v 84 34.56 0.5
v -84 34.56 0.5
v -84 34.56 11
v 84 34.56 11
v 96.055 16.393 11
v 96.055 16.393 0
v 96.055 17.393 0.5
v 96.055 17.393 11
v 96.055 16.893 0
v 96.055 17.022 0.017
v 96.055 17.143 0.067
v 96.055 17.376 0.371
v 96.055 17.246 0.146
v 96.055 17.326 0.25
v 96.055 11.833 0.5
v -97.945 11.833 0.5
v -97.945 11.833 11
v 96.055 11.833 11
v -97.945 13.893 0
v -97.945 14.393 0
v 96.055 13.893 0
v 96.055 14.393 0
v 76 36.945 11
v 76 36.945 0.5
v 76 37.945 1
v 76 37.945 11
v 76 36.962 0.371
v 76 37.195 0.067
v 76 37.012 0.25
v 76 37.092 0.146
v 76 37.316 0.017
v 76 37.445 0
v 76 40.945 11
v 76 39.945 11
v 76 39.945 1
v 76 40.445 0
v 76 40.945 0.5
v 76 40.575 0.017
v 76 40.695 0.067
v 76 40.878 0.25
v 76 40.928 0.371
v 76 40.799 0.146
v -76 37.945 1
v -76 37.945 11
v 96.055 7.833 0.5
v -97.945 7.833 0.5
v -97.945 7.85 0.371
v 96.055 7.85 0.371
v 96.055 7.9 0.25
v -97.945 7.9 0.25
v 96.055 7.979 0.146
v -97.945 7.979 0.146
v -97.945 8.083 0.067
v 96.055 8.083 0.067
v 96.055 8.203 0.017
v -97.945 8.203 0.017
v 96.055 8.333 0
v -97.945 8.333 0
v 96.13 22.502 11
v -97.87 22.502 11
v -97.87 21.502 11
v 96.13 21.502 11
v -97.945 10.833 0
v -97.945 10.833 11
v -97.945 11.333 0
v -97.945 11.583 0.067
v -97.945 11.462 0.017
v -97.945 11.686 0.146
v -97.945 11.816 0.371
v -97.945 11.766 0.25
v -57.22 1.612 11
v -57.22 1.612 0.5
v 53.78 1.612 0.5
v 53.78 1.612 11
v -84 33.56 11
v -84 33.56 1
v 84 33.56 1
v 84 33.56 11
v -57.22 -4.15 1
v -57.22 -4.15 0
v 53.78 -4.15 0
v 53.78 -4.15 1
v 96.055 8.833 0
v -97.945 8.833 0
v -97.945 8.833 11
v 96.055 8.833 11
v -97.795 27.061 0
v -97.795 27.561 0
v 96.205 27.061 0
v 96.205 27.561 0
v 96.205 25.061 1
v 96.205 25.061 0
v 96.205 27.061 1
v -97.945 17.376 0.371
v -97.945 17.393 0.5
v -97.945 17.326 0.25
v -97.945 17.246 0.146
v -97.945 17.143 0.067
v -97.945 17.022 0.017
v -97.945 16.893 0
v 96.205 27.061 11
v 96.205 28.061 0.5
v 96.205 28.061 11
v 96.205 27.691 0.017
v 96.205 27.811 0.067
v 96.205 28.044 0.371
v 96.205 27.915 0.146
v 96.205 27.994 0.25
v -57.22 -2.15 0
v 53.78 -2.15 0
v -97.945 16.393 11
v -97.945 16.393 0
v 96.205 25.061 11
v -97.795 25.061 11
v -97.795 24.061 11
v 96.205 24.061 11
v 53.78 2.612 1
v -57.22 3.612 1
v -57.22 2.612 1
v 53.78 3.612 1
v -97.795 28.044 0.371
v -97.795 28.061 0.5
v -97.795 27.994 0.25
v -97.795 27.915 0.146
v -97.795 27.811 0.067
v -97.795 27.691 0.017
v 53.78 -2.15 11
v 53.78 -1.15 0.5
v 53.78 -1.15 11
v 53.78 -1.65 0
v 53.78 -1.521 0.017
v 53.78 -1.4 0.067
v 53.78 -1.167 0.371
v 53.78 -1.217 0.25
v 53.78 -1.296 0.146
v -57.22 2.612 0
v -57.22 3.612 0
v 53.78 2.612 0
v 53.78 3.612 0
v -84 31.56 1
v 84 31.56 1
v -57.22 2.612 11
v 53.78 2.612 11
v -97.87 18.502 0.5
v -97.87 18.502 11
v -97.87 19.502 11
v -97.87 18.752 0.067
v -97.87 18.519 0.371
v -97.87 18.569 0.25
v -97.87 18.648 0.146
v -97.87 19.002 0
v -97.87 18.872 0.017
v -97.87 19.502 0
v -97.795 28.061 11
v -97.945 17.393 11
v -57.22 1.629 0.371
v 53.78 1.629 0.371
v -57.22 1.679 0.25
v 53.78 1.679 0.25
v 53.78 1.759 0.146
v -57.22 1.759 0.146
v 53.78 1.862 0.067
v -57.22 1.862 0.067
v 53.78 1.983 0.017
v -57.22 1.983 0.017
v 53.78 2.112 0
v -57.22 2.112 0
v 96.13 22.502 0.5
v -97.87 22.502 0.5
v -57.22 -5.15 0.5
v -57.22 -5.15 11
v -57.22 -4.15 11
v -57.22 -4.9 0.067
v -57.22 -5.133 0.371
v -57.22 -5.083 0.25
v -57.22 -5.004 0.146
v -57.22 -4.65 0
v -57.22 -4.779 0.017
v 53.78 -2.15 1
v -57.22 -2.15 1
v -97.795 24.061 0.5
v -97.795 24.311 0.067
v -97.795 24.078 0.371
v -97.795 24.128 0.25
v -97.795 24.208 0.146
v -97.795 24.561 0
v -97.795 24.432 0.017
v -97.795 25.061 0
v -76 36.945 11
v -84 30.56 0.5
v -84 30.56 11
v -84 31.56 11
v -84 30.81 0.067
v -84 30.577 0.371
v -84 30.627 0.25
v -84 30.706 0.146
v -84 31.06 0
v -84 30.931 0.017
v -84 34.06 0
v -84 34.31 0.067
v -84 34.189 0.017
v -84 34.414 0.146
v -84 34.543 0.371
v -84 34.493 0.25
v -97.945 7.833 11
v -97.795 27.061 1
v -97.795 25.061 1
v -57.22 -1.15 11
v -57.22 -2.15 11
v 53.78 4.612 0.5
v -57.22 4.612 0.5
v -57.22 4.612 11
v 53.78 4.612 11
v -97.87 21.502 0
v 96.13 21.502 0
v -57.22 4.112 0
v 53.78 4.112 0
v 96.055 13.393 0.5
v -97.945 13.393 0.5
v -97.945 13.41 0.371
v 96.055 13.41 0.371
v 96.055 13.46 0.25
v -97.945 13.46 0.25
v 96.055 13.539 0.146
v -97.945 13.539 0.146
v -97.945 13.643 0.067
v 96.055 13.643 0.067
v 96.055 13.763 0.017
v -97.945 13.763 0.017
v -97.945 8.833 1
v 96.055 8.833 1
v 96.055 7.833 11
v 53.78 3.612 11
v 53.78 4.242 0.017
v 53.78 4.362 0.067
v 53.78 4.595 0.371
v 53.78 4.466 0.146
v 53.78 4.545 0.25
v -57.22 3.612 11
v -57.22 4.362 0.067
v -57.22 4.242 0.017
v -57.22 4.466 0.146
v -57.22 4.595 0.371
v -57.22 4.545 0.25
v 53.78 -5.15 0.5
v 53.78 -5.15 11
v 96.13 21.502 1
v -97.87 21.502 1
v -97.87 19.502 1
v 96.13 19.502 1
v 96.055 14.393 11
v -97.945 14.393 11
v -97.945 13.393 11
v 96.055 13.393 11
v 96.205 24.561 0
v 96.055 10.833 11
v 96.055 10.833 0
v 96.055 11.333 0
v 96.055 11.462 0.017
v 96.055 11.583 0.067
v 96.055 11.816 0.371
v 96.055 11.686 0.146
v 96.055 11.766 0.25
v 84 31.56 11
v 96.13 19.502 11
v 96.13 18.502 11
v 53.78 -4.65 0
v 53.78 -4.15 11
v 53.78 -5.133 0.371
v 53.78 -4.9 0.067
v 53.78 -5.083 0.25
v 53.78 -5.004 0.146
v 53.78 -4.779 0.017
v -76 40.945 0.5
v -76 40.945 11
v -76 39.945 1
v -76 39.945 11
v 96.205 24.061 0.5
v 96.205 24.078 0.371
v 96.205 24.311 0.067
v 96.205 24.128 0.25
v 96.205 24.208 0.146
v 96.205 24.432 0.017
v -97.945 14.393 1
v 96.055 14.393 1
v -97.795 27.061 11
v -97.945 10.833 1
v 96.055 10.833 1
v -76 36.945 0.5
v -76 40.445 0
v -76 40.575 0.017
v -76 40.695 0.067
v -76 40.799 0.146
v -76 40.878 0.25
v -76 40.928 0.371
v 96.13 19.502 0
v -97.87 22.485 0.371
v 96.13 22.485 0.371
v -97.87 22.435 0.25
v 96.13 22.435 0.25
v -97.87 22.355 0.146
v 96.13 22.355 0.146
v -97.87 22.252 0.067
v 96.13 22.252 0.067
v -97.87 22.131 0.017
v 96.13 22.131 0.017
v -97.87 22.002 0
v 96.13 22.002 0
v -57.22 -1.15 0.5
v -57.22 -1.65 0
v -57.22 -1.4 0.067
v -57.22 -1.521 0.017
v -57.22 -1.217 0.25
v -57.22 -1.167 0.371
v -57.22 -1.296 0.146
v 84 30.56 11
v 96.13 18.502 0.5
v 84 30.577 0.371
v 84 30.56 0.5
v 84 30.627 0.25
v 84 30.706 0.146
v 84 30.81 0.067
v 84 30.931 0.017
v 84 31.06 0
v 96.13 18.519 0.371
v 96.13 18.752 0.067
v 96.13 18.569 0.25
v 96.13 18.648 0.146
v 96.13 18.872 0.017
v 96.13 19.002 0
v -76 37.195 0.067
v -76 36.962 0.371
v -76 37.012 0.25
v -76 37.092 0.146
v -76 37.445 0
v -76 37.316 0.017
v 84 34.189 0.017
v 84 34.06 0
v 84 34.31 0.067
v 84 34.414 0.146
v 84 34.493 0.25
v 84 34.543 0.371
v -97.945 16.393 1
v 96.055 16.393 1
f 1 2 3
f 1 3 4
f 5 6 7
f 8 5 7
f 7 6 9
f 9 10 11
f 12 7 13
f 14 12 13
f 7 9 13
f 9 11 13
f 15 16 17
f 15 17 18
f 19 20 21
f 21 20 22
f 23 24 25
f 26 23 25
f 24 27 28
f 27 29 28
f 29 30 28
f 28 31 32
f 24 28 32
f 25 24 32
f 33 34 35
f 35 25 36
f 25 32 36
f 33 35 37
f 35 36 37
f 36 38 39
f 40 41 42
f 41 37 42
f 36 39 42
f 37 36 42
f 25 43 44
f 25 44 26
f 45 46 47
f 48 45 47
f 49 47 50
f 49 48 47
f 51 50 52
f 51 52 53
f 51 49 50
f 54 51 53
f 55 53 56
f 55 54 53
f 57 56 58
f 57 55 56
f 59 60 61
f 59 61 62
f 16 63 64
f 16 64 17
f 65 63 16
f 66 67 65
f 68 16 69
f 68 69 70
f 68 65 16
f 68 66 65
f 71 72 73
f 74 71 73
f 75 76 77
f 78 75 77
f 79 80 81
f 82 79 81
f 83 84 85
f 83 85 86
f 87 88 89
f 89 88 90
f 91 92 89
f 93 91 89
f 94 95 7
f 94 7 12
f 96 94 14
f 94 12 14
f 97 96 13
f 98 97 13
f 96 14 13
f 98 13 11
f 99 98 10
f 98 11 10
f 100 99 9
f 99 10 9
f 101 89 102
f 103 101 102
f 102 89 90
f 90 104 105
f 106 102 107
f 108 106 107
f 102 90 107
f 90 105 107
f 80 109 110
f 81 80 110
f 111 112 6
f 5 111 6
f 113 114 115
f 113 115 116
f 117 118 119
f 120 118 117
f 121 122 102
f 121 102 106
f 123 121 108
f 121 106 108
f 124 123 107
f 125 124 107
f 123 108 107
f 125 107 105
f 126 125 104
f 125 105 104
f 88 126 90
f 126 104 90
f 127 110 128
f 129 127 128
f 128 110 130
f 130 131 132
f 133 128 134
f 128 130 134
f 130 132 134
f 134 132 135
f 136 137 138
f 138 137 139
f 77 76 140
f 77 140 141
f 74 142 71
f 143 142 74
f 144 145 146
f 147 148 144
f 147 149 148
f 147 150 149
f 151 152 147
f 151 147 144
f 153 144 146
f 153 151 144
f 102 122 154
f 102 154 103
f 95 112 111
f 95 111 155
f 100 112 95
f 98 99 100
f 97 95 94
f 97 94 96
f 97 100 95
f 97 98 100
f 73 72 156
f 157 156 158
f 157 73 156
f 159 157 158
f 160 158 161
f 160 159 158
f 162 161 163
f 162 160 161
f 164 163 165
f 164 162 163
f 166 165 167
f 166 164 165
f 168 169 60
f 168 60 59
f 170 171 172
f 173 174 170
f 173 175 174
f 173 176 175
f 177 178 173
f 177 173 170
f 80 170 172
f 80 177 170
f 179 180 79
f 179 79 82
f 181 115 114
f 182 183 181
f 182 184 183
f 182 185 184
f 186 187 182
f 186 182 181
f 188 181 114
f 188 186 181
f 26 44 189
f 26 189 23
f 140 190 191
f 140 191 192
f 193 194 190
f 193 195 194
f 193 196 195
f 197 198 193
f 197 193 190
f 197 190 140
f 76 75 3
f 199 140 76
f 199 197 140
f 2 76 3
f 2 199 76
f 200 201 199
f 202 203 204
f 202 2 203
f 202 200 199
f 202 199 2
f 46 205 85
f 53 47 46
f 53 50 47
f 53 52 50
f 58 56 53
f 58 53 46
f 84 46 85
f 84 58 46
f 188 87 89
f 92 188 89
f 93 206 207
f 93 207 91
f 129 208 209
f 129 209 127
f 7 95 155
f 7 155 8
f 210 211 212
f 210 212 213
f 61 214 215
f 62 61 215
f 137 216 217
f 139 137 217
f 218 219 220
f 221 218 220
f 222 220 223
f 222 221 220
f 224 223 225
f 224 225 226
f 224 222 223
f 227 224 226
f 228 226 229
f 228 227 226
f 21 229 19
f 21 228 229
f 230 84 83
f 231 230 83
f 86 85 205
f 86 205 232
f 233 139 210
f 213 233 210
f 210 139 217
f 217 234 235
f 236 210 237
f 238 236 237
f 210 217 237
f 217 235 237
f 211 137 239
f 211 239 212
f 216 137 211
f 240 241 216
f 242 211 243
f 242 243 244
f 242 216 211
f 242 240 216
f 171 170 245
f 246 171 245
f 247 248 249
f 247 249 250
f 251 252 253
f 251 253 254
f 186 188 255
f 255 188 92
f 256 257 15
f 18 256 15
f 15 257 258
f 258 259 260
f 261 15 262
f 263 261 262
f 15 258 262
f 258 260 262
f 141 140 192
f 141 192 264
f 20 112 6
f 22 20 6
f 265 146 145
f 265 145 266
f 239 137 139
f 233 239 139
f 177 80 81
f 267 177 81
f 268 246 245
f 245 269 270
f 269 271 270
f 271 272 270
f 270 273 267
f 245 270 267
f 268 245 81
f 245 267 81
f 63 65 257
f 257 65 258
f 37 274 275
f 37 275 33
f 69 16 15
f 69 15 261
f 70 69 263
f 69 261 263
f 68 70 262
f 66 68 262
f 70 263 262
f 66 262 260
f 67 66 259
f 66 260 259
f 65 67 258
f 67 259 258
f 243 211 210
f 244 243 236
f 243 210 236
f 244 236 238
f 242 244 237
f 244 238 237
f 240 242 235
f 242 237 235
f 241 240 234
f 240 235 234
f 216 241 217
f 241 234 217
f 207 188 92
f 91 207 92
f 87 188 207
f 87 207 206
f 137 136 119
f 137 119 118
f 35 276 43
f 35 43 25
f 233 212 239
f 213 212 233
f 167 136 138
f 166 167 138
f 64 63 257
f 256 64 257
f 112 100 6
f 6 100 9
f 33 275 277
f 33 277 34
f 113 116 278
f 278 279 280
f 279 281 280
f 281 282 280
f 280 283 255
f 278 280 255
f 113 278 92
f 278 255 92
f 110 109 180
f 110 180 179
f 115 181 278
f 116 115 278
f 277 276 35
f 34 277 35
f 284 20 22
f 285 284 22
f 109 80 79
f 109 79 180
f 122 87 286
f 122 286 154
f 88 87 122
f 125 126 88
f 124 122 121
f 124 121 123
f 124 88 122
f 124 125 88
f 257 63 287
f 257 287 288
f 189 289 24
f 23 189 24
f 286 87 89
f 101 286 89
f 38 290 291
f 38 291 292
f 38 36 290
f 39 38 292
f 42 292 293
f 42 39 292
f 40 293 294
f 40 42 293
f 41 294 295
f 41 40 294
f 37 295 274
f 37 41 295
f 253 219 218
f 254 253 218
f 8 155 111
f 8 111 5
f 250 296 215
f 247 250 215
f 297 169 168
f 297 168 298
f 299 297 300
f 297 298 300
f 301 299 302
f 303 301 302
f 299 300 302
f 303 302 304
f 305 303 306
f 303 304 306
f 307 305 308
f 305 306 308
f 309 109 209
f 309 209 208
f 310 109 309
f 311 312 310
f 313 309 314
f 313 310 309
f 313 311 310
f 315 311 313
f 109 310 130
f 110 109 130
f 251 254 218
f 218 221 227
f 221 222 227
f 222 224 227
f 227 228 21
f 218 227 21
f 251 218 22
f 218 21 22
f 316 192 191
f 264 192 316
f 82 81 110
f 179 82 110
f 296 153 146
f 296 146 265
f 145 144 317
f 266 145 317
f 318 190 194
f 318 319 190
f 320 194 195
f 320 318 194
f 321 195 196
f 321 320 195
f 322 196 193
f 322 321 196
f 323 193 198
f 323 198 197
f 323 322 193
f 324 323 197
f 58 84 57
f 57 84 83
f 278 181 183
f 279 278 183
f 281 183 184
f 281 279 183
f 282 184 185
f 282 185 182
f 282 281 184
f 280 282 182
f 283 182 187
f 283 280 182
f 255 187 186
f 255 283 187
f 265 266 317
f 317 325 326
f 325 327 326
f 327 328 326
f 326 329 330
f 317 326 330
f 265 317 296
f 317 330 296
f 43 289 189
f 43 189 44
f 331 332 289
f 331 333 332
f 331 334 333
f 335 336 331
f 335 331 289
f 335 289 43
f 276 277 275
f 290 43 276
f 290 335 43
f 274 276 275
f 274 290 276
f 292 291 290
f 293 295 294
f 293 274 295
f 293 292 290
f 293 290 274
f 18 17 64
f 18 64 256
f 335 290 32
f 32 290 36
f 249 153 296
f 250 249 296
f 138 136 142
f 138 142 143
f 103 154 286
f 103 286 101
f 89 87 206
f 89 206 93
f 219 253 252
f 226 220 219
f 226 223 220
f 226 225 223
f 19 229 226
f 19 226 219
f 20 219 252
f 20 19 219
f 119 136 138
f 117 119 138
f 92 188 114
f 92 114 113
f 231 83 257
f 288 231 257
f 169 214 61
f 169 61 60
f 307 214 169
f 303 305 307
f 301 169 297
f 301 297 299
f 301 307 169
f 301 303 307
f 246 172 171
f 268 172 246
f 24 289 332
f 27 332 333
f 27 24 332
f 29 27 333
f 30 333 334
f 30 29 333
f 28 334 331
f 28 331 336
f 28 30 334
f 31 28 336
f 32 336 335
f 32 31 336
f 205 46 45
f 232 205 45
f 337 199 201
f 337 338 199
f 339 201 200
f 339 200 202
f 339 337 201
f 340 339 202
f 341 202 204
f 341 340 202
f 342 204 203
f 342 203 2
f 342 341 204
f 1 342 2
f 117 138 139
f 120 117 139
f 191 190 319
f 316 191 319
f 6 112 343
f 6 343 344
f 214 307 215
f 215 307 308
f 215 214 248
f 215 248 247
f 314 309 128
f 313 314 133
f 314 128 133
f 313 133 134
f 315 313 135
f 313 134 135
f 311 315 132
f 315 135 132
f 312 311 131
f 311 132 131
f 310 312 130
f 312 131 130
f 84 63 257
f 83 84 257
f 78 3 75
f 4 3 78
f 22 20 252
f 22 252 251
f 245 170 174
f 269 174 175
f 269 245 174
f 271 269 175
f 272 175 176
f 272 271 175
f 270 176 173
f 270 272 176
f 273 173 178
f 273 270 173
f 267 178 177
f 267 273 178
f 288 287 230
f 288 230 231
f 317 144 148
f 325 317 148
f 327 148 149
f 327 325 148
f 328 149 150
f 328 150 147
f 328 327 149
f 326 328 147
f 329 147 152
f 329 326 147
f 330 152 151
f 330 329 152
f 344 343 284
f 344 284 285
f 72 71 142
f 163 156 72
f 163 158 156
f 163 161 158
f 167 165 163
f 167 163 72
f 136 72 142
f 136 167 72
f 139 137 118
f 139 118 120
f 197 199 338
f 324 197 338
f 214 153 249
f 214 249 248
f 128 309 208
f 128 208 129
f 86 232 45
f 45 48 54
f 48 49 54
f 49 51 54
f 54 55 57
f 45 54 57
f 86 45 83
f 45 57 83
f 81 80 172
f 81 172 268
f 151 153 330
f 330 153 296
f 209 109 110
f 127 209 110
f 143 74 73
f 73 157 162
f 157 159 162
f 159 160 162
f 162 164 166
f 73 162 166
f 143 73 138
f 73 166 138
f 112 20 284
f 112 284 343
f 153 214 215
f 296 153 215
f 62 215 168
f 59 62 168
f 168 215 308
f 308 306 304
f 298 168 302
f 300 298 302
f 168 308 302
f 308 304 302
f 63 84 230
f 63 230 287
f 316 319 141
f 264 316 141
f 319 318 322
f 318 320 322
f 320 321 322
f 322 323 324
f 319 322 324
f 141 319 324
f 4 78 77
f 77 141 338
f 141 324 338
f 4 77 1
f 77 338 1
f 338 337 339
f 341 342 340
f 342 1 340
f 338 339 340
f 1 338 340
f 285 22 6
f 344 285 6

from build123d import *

# Parameters (mm, degrees)
F0_W      = 111
F0_H      = 1
F0_H_2    = 2
F1_DEPTH  = 1
F2_DEPTH  = 11
F3_R      = 0.5
F4_W      = 194
F4_H      = 2
F5_DEPTH  = 1
F4_H_2    = 1
F6_DEPTH  = 11
F7_R      = 0.5
F8_W      = 168
F8_H      = 2
F9_DEPTH  = 1
F8_H_2    = 1
F10_DEPTH = 11
F11_R     = 0.5
F12_W     = 152
F12_H     = 2
F13_DEPTH = 1
F12_H_2   = 1
F14_DEPTH = 11
F15_R     = 0.5


with BuildPart() as f1:
    # F0 (on Top) → F1 (new body)
    with BuildSketch(Plane.XY):
        with Locations((-1.720381, 3.112242)):
            Rectangle(F0_W, F0_H)
        with Locations((-1.720381, -3.150044)):
            Rectangle(F0_W, F0_H_2)
    extrude(amount=F1_DEPTH)


with BuildPart() as f2:
    # F0 (on Top) → F2 (new body)
    with BuildSketch(Plane.XY):
        with Locations((-1.720381, 4.112242)):
            Rectangle(F0_W, F0_H)
        with Locations((-1.720381, 2.112242)):
            Rectangle(F0_W, F0_H)
        with Locations((-1.720381, -1.650044)):
            Rectangle(F0_W, F0_H)
        with Locations((-1.720381, -4.650044)):
            Rectangle(F0_W, F0_H)
    extrude(amount=F2_DEPTH)

    # F3
    f3_edges = [f2.edges().sort_by_distance(p)[0] for p in [
        (-1.720381, -5.150044, 0),
        (-1.720381, -1.150044, 0),
        (-1.720381, 1.612242, 0),
        (-1.720381, 4.612242, 0),
    ]]
    fillet(f3_edges, radius=F3_R)


with BuildPart() as f5:
    # F4 (on Top) → F5 (new body)
    with BuildSketch(Plane.XY):
        with Locations((-0.795144, 26.061376)):
            Rectangle(F4_W, F4_H)
        with Locations((-0.870275, 20.501598)):
            Rectangle(F4_W, F4_H)
        with Locations((-0.945407, 15.392613)):
            Rectangle(F4_W, F4_H)
        with Locations((-0.945407, 9.832834)):
            Rectangle(F4_W, F4_H)
    extrude(amount=F5_DEPTH)


with BuildPart() as f6:
    # F4 (on Top) → F6 (new body)
    with BuildSketch(Plane.XY):
        with Locations((-0.795144, 27.561376)):
            Rectangle(F4_W, F4_H_2)
        with Locations((-0.795144, 24.561376)):
            Rectangle(F4_W, F4_H_2)
        with Locations((-0.870275, 22.001598)):
            Rectangle(F4_W, F4_H_2)
        with Locations((-0.870275, 19.001598)):
            Rectangle(F4_W, F4_H_2)
        with Locations((-0.945407, 16.892613)):
            Rectangle(F4_W, F4_H_2)
        with Locations((-0.945407, 13.892613)):
            Rectangle(F4_W, F4_H_2)
        with Locations((-0.945407, 11.332834)):
            Rectangle(F4_W, F4_H_2)
        with Locations((-0.945407, 8.332834)):
            Rectangle(F4_W, F4_H_2)
    extrude(amount=F6_DEPTH)

    # F7
    f7_edges = [f6.edges().sort_by_distance(p)[0] for p in [
        (-0.945407, 7.832834, 0),
        (-0.945407, 11.832834, 0),
        (-0.945407, 13.392613, 0),
        (-0.945407, 17.392613, 0),
        (-0.870275, 18.501598, 0),
        (-0.870275, 22.501598, 0),
        (-0.795144, 24.061376, 0),
        (-0.795144, 28.061376, 0),
    ]]
    fillet(f7_edges, radius=F7_R)


with BuildPart() as f9:
    # F8 (on Top) → F9 (new body)
    with BuildSketch(Plane.XY):
        with Locations((0, 32.560032)):
            Rectangle(F8_W, F8_H)
    extrude(amount=F9_DEPTH)

    # F8 (on Top) → F10 (join)
    with BuildSketch(Plane.XY):
        with Locations((0, 34.060032)):
            Rectangle(F8_W, F8_H_2)
        with Locations((0, 31.060032)):
            Rectangle(F8_W, F8_H_2)
    extrude(amount=F10_DEPTH)

    # F11
    f11_edges = [f9.edges().sort_by_distance(p)[0] for p in [
        (0, 30.560032, 0),
        (0, 34.560032, 0),
    ]]
    fillet(f11_edges, radius=F11_R)


with BuildPart() as f13:
    # F12 (on Top) → F13 (new body)
    with BuildSketch(Plane.XY):
        with Locations((0, 38.945407)):
            Rectangle(F12_W, F12_H)
    extrude(amount=F13_DEPTH)

    # F12 (on Top) → F14 (join)
    with BuildSketch(Plane.XY):
        with Locations((0, 40.445407)):
            Rectangle(F12_W, F12_H_2)
        with Locations((0, 37.445407)):
            Rectangle(F12_W, F12_H_2)
    extrude(amount=F14_DEPTH)

    # F15
    f15_edges = [f13.edges().sort_by_distance(p)[0] for p in [
        (0, 40.945407, 0),
        (0, 36.945407, 0),
    ]]
    fillet(f15_edges, radius=F15_R)


solid = Compound([f1.part, f2.part, f5.part, f6.part, f9.part, f13.part])
